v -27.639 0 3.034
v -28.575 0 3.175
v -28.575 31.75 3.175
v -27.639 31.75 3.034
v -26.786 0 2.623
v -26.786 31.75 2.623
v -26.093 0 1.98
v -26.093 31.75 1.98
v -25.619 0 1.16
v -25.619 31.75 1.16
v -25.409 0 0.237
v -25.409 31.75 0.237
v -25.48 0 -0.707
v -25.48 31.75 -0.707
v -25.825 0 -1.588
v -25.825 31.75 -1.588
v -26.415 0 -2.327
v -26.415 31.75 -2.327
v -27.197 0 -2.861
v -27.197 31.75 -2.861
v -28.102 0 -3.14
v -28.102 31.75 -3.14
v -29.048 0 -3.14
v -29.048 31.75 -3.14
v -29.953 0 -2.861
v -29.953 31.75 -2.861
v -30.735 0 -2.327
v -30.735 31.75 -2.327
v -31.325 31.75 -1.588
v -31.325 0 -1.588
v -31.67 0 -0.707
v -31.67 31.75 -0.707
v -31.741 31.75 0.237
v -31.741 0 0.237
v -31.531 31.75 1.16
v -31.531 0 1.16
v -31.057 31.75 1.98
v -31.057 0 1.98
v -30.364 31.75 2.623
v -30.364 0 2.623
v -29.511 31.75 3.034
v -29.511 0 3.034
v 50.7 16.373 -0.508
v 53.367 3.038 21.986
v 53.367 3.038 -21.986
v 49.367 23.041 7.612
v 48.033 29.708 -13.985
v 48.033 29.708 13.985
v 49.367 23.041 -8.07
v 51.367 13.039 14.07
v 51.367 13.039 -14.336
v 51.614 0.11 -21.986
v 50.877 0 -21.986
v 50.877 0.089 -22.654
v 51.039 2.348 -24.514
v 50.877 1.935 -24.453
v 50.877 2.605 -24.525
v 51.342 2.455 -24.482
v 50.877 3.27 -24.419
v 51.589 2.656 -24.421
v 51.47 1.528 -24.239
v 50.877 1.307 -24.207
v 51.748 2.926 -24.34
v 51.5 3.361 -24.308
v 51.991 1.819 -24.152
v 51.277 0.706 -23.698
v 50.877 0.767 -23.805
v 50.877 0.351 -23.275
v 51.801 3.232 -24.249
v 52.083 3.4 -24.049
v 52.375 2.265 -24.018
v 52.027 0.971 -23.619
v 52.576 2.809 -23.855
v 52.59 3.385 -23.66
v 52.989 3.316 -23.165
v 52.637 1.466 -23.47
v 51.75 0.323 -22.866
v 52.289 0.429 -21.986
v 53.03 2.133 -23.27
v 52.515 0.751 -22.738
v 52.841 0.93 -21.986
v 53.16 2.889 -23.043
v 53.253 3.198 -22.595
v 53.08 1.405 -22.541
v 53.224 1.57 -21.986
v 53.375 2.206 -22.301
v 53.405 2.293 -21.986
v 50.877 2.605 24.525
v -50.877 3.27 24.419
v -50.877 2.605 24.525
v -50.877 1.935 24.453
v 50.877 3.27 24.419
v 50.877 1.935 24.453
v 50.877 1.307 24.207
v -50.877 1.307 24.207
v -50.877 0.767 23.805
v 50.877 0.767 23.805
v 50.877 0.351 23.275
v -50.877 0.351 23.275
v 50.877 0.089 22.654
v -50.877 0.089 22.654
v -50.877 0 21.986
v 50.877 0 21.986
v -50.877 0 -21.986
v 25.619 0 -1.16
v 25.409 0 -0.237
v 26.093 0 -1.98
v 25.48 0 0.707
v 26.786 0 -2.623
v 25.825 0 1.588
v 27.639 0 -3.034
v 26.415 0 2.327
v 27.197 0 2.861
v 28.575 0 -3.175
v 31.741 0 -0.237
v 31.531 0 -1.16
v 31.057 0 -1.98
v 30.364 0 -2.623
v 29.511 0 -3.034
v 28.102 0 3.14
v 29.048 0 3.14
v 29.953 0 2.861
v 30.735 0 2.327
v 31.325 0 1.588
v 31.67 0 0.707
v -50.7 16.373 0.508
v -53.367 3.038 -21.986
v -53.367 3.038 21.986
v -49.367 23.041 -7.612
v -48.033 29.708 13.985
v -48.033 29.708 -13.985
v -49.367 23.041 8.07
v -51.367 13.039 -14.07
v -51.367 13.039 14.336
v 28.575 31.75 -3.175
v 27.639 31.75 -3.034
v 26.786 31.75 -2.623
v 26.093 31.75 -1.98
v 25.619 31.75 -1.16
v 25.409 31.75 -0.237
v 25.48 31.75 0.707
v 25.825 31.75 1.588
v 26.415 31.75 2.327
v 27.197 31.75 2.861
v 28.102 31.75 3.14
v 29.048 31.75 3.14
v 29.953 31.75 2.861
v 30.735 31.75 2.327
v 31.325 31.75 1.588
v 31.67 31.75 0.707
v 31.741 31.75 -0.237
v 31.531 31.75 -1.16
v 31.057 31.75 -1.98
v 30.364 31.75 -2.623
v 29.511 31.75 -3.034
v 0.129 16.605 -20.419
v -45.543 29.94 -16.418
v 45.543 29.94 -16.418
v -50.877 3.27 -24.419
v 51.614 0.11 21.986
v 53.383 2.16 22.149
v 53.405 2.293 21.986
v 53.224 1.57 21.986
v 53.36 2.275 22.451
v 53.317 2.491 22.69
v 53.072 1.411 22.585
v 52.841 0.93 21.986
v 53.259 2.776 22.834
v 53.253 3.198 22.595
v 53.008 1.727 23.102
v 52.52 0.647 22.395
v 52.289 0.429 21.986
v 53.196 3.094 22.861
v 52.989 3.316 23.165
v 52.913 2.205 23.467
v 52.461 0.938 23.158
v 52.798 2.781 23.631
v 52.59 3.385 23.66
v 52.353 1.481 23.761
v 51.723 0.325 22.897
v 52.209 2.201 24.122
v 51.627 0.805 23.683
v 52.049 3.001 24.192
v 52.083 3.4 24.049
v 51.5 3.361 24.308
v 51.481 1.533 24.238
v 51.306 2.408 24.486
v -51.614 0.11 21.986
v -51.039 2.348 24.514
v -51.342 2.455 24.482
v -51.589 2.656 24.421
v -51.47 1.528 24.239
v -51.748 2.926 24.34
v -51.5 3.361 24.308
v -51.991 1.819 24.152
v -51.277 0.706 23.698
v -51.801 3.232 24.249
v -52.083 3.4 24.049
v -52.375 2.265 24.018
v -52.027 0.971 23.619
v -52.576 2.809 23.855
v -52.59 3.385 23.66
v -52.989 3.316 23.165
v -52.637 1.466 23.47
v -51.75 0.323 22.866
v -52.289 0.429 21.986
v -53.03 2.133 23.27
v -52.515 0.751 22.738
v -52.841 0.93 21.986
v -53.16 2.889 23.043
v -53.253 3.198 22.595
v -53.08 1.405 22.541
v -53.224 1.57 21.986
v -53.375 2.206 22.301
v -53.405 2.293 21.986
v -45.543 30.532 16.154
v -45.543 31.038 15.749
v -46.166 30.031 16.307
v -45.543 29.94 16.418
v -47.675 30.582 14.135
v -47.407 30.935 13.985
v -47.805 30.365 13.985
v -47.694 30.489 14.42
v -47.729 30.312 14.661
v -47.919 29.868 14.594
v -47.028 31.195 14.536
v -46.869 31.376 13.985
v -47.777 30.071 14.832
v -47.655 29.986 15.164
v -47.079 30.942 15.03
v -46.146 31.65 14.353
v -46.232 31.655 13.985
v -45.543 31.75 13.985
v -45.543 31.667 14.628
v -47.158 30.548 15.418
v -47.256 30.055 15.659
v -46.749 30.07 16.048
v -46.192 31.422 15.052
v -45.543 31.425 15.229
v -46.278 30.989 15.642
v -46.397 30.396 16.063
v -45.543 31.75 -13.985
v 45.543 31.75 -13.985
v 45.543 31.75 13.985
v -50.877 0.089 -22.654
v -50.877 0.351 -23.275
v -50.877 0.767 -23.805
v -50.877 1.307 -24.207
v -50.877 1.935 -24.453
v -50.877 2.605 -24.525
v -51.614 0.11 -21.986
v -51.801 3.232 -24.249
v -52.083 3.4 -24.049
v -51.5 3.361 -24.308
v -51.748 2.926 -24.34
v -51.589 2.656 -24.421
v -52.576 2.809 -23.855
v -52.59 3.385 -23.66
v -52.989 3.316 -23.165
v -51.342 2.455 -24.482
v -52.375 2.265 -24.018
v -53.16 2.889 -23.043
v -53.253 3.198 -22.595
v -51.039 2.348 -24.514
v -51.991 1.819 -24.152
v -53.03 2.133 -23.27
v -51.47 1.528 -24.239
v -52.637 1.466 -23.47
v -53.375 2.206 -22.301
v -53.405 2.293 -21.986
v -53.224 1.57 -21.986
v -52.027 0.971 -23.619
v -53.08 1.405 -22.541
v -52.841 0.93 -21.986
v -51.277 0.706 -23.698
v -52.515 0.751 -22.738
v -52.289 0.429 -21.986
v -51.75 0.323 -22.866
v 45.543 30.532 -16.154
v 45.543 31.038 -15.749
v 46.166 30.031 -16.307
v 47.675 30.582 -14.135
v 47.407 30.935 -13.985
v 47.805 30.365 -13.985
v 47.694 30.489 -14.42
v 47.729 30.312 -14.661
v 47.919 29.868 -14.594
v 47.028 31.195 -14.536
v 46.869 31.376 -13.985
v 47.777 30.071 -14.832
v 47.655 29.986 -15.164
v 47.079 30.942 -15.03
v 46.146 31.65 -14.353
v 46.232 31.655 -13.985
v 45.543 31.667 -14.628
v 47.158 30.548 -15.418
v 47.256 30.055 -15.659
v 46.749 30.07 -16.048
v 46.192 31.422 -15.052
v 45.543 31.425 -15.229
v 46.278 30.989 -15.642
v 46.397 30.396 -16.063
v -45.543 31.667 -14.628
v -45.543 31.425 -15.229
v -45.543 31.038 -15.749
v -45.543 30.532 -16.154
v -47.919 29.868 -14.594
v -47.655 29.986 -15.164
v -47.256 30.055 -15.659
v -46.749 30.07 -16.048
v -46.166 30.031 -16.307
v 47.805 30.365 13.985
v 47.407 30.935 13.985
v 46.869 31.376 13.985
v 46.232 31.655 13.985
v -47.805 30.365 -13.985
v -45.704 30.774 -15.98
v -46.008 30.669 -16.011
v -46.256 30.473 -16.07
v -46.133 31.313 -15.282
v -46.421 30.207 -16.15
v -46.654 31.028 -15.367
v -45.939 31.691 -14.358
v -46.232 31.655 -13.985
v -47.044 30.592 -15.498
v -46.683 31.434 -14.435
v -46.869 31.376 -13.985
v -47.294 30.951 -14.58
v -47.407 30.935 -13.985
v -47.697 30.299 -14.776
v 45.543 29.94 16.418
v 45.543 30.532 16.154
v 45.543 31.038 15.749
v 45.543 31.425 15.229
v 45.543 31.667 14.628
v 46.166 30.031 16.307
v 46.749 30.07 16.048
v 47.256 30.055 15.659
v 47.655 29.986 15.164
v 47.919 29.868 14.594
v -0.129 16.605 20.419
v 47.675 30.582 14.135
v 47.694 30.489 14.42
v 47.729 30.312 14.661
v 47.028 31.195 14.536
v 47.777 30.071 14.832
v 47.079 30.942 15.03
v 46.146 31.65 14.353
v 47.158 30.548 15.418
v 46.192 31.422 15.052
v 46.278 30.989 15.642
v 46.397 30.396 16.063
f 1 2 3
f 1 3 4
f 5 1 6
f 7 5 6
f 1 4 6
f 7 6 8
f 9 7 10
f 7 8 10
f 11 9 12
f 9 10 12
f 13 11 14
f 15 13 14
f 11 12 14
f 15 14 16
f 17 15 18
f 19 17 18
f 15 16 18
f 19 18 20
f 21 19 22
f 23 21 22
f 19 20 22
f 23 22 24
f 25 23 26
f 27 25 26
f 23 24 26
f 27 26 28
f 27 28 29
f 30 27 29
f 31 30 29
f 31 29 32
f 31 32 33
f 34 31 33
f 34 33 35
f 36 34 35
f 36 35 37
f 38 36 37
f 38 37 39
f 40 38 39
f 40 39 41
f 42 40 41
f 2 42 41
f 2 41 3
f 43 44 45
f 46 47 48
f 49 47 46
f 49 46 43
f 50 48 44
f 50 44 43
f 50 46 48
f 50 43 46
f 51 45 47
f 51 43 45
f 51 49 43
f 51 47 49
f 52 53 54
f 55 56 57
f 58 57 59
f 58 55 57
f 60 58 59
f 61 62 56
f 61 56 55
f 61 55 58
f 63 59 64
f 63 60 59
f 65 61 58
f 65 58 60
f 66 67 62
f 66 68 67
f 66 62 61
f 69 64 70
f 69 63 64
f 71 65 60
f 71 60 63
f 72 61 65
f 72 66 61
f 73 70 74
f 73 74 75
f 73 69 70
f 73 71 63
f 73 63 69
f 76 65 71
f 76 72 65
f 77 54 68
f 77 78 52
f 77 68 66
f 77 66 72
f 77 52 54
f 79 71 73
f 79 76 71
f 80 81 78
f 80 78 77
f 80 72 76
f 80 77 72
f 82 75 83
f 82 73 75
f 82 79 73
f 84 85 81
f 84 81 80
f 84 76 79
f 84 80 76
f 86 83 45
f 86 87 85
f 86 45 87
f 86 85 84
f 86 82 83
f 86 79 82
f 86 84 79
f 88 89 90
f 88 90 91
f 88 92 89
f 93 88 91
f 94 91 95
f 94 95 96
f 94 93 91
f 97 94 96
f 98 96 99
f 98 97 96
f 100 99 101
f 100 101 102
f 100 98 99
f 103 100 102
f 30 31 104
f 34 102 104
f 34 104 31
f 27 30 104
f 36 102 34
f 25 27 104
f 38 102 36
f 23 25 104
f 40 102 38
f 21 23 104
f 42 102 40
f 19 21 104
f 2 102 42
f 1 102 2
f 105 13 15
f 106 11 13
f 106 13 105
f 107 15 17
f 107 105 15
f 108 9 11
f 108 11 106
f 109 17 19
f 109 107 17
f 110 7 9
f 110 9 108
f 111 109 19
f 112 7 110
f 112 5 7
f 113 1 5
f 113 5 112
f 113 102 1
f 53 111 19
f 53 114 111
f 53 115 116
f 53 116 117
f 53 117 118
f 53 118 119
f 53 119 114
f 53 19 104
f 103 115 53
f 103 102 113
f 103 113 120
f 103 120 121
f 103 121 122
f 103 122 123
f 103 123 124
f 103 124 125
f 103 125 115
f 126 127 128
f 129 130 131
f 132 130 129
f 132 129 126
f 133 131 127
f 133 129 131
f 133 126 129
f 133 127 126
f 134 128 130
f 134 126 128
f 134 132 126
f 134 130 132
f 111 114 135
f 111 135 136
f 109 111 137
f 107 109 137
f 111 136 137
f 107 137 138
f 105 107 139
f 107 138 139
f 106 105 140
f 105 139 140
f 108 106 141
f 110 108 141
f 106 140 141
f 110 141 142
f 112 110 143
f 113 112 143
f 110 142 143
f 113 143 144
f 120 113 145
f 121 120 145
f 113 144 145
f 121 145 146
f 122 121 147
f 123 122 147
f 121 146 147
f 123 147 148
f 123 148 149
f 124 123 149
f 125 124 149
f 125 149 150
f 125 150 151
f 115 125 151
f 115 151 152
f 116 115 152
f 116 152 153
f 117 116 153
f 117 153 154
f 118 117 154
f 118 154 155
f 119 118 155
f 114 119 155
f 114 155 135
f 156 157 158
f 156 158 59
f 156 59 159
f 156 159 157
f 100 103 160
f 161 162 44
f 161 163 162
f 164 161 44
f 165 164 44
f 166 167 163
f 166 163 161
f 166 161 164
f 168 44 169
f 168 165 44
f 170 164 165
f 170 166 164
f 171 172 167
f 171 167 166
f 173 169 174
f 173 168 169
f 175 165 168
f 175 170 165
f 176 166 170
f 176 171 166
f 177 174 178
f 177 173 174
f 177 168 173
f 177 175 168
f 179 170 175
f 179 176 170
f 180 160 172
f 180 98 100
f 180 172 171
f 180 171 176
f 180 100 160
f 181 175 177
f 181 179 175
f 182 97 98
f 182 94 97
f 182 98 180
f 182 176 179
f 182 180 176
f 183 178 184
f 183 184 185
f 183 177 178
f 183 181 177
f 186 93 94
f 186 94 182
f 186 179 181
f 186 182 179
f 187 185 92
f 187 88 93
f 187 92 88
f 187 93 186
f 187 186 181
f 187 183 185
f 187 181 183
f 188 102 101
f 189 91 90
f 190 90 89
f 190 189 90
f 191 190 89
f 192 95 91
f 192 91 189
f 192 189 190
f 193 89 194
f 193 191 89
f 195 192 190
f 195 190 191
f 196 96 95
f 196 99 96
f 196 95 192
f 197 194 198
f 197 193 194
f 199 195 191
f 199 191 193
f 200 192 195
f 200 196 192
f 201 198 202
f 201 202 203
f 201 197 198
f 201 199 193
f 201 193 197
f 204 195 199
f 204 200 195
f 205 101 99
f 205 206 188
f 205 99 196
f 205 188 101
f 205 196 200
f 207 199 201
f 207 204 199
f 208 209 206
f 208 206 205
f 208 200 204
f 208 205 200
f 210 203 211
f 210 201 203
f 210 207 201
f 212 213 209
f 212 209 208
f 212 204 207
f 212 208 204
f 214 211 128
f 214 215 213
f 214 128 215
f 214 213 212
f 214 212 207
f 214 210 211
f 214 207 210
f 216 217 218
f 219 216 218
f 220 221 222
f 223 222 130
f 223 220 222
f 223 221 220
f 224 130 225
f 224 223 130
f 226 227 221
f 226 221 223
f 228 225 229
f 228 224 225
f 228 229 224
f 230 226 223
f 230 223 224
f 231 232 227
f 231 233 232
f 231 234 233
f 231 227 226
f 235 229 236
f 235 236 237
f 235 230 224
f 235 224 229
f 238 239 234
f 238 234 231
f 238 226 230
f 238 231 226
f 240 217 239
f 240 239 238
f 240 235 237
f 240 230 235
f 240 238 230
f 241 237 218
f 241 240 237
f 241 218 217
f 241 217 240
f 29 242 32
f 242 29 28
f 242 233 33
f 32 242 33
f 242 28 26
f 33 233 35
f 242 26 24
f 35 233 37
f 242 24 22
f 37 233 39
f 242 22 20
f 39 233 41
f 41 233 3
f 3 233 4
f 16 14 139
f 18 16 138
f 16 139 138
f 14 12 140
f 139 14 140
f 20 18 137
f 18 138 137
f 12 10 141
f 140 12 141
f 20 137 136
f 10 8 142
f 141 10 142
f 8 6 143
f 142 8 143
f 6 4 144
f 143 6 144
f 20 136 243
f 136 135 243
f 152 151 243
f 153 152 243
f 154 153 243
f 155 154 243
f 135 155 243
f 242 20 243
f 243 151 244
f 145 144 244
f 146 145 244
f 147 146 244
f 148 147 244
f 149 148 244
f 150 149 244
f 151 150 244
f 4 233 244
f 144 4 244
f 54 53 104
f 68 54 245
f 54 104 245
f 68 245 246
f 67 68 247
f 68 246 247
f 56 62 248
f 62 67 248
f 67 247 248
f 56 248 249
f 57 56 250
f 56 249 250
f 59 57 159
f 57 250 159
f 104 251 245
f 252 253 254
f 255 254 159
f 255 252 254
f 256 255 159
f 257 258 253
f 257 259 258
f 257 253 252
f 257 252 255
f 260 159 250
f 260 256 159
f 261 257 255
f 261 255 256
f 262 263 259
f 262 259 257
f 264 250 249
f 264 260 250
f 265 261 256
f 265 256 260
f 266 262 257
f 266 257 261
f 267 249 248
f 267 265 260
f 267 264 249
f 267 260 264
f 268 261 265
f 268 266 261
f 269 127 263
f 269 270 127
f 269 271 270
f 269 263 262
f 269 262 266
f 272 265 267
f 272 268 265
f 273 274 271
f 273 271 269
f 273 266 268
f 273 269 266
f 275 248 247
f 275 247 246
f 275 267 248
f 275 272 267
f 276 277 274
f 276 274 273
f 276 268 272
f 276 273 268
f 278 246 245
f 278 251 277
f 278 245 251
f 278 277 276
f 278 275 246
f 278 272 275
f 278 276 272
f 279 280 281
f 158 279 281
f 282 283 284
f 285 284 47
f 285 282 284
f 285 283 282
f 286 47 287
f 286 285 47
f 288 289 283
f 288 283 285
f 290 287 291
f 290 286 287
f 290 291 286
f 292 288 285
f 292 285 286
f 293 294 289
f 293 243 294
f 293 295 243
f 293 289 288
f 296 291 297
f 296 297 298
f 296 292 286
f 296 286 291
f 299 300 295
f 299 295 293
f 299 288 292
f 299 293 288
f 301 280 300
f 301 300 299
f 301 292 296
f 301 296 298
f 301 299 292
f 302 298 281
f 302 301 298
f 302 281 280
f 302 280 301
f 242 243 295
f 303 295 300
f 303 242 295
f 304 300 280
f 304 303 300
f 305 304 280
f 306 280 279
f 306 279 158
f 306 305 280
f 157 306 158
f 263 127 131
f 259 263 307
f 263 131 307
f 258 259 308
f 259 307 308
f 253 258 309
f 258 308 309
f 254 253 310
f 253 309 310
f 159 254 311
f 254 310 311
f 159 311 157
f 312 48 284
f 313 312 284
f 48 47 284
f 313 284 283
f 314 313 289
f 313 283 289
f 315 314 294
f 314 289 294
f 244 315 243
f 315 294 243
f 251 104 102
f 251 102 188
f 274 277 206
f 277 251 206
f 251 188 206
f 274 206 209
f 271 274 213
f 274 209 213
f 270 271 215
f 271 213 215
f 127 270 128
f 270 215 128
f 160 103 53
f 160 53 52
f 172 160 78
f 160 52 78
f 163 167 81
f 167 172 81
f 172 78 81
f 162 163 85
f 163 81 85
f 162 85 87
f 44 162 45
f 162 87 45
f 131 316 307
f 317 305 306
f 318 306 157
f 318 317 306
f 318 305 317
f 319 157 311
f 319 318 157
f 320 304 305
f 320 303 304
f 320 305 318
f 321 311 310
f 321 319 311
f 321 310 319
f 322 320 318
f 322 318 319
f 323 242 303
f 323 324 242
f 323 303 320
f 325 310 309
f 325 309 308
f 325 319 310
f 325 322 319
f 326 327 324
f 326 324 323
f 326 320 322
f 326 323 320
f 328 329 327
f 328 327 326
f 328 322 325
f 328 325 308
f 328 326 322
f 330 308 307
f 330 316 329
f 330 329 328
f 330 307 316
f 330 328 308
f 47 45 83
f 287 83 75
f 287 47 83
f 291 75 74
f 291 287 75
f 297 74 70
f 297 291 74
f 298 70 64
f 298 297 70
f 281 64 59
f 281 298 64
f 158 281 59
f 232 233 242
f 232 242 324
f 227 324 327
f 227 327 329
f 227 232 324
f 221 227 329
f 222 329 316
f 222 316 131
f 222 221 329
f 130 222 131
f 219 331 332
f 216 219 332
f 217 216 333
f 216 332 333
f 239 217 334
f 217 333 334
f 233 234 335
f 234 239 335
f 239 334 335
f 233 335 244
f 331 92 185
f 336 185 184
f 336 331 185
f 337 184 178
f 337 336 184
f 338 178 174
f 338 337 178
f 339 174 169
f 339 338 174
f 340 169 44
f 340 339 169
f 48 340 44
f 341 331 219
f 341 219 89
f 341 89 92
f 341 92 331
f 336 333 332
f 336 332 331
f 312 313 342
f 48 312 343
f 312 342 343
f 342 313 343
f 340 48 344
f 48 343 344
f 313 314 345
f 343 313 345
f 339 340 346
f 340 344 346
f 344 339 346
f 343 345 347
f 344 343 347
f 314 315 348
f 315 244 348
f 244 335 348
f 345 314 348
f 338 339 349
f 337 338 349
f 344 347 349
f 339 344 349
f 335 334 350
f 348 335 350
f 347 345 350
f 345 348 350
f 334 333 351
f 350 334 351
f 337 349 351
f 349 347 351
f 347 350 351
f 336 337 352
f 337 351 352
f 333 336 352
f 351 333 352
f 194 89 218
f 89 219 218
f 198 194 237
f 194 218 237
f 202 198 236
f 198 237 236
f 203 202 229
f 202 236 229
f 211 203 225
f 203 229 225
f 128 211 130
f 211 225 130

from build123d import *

# Parameters (mm, degrees)
SKETCH3_R          = 3.175
CUT_EXTRUDE1_DEPTH = 68.57605454
FILLET1_R          = 2.54


with BuildPart() as part:
    # Sketch1 → Loft1 section 0
    with BuildSketch(Plane(origin=(0, 0, 0), x_dir=(1, 0, 0), z_dir=(0, 1, 0))):
        with BuildLine():
            Line((-53.975, -25.4), (53.975, -25.4))
            Line((53.975, -25.4), (53.975, 25.4))
            Line((53.975, 25.4), (-53.975, 25.4))
            Line((-53.975, 25.4), (-53.975, -25.4))
        make_face()
    # Sketch2 → Loft1 section 1
    with BuildSketch(Plane(origin=(0, 31.75, 0), x_dir=(1, 0, 0), z_dir=(0, 1, 0))):
        with BuildLine():
            Line((-47.625, -15.875), (47.625, -15.875))
            Line((47.625, -15.875), (47.625, 15.875))
            Line((47.625, 15.875), (-47.625, 15.875))
            Line((-47.625, 15.875), (-47.625, -15.875))
        make_face()
    loft()

    # Sketch3 → Cut-Extrude1 (cut, through all)
    with BuildSketch(Plane(origin=(0, 31.75, 0), x_dir=(1, 0, 0), z_dir=(0, 1, 0))):
        with Locations(Location((-28.575, 0, 0), (0, 0, 270))):
            Circle(SKETCH3_R)
        with Locations(Location((28.575, 0, 0), (0, 0, 90))):
            Circle(SKETCH3_R)
    extrude(amount=-CUT_EXTRUDE1_DEPTH, mode=Mode.SUBTRACT)

    # Fillet1
    fillet1_edges = [part.edges().sort_by_distance(p)[0] for p in [
        (-53.975, 0, 0),
        (0, 31.75, 15.875),
        (-47.625, 31.75, 0),
        (0, 31.75, -15.875),
        (47.625, 31.75, 0),
        (0, 0, 25.4),
        (53.975, 0, 0),
        (-50.8, 15.875, -20.6375),
        (0, 0, -25.4),
        (50.8, 15.875, -20.6375),
        (-50.8, 15.875, 20.6375),
        (50.8, 15.875, 20.6375),
    ]]
    fillet(fillet1_edges, radius=FILLET1_R)


solid = part.part
